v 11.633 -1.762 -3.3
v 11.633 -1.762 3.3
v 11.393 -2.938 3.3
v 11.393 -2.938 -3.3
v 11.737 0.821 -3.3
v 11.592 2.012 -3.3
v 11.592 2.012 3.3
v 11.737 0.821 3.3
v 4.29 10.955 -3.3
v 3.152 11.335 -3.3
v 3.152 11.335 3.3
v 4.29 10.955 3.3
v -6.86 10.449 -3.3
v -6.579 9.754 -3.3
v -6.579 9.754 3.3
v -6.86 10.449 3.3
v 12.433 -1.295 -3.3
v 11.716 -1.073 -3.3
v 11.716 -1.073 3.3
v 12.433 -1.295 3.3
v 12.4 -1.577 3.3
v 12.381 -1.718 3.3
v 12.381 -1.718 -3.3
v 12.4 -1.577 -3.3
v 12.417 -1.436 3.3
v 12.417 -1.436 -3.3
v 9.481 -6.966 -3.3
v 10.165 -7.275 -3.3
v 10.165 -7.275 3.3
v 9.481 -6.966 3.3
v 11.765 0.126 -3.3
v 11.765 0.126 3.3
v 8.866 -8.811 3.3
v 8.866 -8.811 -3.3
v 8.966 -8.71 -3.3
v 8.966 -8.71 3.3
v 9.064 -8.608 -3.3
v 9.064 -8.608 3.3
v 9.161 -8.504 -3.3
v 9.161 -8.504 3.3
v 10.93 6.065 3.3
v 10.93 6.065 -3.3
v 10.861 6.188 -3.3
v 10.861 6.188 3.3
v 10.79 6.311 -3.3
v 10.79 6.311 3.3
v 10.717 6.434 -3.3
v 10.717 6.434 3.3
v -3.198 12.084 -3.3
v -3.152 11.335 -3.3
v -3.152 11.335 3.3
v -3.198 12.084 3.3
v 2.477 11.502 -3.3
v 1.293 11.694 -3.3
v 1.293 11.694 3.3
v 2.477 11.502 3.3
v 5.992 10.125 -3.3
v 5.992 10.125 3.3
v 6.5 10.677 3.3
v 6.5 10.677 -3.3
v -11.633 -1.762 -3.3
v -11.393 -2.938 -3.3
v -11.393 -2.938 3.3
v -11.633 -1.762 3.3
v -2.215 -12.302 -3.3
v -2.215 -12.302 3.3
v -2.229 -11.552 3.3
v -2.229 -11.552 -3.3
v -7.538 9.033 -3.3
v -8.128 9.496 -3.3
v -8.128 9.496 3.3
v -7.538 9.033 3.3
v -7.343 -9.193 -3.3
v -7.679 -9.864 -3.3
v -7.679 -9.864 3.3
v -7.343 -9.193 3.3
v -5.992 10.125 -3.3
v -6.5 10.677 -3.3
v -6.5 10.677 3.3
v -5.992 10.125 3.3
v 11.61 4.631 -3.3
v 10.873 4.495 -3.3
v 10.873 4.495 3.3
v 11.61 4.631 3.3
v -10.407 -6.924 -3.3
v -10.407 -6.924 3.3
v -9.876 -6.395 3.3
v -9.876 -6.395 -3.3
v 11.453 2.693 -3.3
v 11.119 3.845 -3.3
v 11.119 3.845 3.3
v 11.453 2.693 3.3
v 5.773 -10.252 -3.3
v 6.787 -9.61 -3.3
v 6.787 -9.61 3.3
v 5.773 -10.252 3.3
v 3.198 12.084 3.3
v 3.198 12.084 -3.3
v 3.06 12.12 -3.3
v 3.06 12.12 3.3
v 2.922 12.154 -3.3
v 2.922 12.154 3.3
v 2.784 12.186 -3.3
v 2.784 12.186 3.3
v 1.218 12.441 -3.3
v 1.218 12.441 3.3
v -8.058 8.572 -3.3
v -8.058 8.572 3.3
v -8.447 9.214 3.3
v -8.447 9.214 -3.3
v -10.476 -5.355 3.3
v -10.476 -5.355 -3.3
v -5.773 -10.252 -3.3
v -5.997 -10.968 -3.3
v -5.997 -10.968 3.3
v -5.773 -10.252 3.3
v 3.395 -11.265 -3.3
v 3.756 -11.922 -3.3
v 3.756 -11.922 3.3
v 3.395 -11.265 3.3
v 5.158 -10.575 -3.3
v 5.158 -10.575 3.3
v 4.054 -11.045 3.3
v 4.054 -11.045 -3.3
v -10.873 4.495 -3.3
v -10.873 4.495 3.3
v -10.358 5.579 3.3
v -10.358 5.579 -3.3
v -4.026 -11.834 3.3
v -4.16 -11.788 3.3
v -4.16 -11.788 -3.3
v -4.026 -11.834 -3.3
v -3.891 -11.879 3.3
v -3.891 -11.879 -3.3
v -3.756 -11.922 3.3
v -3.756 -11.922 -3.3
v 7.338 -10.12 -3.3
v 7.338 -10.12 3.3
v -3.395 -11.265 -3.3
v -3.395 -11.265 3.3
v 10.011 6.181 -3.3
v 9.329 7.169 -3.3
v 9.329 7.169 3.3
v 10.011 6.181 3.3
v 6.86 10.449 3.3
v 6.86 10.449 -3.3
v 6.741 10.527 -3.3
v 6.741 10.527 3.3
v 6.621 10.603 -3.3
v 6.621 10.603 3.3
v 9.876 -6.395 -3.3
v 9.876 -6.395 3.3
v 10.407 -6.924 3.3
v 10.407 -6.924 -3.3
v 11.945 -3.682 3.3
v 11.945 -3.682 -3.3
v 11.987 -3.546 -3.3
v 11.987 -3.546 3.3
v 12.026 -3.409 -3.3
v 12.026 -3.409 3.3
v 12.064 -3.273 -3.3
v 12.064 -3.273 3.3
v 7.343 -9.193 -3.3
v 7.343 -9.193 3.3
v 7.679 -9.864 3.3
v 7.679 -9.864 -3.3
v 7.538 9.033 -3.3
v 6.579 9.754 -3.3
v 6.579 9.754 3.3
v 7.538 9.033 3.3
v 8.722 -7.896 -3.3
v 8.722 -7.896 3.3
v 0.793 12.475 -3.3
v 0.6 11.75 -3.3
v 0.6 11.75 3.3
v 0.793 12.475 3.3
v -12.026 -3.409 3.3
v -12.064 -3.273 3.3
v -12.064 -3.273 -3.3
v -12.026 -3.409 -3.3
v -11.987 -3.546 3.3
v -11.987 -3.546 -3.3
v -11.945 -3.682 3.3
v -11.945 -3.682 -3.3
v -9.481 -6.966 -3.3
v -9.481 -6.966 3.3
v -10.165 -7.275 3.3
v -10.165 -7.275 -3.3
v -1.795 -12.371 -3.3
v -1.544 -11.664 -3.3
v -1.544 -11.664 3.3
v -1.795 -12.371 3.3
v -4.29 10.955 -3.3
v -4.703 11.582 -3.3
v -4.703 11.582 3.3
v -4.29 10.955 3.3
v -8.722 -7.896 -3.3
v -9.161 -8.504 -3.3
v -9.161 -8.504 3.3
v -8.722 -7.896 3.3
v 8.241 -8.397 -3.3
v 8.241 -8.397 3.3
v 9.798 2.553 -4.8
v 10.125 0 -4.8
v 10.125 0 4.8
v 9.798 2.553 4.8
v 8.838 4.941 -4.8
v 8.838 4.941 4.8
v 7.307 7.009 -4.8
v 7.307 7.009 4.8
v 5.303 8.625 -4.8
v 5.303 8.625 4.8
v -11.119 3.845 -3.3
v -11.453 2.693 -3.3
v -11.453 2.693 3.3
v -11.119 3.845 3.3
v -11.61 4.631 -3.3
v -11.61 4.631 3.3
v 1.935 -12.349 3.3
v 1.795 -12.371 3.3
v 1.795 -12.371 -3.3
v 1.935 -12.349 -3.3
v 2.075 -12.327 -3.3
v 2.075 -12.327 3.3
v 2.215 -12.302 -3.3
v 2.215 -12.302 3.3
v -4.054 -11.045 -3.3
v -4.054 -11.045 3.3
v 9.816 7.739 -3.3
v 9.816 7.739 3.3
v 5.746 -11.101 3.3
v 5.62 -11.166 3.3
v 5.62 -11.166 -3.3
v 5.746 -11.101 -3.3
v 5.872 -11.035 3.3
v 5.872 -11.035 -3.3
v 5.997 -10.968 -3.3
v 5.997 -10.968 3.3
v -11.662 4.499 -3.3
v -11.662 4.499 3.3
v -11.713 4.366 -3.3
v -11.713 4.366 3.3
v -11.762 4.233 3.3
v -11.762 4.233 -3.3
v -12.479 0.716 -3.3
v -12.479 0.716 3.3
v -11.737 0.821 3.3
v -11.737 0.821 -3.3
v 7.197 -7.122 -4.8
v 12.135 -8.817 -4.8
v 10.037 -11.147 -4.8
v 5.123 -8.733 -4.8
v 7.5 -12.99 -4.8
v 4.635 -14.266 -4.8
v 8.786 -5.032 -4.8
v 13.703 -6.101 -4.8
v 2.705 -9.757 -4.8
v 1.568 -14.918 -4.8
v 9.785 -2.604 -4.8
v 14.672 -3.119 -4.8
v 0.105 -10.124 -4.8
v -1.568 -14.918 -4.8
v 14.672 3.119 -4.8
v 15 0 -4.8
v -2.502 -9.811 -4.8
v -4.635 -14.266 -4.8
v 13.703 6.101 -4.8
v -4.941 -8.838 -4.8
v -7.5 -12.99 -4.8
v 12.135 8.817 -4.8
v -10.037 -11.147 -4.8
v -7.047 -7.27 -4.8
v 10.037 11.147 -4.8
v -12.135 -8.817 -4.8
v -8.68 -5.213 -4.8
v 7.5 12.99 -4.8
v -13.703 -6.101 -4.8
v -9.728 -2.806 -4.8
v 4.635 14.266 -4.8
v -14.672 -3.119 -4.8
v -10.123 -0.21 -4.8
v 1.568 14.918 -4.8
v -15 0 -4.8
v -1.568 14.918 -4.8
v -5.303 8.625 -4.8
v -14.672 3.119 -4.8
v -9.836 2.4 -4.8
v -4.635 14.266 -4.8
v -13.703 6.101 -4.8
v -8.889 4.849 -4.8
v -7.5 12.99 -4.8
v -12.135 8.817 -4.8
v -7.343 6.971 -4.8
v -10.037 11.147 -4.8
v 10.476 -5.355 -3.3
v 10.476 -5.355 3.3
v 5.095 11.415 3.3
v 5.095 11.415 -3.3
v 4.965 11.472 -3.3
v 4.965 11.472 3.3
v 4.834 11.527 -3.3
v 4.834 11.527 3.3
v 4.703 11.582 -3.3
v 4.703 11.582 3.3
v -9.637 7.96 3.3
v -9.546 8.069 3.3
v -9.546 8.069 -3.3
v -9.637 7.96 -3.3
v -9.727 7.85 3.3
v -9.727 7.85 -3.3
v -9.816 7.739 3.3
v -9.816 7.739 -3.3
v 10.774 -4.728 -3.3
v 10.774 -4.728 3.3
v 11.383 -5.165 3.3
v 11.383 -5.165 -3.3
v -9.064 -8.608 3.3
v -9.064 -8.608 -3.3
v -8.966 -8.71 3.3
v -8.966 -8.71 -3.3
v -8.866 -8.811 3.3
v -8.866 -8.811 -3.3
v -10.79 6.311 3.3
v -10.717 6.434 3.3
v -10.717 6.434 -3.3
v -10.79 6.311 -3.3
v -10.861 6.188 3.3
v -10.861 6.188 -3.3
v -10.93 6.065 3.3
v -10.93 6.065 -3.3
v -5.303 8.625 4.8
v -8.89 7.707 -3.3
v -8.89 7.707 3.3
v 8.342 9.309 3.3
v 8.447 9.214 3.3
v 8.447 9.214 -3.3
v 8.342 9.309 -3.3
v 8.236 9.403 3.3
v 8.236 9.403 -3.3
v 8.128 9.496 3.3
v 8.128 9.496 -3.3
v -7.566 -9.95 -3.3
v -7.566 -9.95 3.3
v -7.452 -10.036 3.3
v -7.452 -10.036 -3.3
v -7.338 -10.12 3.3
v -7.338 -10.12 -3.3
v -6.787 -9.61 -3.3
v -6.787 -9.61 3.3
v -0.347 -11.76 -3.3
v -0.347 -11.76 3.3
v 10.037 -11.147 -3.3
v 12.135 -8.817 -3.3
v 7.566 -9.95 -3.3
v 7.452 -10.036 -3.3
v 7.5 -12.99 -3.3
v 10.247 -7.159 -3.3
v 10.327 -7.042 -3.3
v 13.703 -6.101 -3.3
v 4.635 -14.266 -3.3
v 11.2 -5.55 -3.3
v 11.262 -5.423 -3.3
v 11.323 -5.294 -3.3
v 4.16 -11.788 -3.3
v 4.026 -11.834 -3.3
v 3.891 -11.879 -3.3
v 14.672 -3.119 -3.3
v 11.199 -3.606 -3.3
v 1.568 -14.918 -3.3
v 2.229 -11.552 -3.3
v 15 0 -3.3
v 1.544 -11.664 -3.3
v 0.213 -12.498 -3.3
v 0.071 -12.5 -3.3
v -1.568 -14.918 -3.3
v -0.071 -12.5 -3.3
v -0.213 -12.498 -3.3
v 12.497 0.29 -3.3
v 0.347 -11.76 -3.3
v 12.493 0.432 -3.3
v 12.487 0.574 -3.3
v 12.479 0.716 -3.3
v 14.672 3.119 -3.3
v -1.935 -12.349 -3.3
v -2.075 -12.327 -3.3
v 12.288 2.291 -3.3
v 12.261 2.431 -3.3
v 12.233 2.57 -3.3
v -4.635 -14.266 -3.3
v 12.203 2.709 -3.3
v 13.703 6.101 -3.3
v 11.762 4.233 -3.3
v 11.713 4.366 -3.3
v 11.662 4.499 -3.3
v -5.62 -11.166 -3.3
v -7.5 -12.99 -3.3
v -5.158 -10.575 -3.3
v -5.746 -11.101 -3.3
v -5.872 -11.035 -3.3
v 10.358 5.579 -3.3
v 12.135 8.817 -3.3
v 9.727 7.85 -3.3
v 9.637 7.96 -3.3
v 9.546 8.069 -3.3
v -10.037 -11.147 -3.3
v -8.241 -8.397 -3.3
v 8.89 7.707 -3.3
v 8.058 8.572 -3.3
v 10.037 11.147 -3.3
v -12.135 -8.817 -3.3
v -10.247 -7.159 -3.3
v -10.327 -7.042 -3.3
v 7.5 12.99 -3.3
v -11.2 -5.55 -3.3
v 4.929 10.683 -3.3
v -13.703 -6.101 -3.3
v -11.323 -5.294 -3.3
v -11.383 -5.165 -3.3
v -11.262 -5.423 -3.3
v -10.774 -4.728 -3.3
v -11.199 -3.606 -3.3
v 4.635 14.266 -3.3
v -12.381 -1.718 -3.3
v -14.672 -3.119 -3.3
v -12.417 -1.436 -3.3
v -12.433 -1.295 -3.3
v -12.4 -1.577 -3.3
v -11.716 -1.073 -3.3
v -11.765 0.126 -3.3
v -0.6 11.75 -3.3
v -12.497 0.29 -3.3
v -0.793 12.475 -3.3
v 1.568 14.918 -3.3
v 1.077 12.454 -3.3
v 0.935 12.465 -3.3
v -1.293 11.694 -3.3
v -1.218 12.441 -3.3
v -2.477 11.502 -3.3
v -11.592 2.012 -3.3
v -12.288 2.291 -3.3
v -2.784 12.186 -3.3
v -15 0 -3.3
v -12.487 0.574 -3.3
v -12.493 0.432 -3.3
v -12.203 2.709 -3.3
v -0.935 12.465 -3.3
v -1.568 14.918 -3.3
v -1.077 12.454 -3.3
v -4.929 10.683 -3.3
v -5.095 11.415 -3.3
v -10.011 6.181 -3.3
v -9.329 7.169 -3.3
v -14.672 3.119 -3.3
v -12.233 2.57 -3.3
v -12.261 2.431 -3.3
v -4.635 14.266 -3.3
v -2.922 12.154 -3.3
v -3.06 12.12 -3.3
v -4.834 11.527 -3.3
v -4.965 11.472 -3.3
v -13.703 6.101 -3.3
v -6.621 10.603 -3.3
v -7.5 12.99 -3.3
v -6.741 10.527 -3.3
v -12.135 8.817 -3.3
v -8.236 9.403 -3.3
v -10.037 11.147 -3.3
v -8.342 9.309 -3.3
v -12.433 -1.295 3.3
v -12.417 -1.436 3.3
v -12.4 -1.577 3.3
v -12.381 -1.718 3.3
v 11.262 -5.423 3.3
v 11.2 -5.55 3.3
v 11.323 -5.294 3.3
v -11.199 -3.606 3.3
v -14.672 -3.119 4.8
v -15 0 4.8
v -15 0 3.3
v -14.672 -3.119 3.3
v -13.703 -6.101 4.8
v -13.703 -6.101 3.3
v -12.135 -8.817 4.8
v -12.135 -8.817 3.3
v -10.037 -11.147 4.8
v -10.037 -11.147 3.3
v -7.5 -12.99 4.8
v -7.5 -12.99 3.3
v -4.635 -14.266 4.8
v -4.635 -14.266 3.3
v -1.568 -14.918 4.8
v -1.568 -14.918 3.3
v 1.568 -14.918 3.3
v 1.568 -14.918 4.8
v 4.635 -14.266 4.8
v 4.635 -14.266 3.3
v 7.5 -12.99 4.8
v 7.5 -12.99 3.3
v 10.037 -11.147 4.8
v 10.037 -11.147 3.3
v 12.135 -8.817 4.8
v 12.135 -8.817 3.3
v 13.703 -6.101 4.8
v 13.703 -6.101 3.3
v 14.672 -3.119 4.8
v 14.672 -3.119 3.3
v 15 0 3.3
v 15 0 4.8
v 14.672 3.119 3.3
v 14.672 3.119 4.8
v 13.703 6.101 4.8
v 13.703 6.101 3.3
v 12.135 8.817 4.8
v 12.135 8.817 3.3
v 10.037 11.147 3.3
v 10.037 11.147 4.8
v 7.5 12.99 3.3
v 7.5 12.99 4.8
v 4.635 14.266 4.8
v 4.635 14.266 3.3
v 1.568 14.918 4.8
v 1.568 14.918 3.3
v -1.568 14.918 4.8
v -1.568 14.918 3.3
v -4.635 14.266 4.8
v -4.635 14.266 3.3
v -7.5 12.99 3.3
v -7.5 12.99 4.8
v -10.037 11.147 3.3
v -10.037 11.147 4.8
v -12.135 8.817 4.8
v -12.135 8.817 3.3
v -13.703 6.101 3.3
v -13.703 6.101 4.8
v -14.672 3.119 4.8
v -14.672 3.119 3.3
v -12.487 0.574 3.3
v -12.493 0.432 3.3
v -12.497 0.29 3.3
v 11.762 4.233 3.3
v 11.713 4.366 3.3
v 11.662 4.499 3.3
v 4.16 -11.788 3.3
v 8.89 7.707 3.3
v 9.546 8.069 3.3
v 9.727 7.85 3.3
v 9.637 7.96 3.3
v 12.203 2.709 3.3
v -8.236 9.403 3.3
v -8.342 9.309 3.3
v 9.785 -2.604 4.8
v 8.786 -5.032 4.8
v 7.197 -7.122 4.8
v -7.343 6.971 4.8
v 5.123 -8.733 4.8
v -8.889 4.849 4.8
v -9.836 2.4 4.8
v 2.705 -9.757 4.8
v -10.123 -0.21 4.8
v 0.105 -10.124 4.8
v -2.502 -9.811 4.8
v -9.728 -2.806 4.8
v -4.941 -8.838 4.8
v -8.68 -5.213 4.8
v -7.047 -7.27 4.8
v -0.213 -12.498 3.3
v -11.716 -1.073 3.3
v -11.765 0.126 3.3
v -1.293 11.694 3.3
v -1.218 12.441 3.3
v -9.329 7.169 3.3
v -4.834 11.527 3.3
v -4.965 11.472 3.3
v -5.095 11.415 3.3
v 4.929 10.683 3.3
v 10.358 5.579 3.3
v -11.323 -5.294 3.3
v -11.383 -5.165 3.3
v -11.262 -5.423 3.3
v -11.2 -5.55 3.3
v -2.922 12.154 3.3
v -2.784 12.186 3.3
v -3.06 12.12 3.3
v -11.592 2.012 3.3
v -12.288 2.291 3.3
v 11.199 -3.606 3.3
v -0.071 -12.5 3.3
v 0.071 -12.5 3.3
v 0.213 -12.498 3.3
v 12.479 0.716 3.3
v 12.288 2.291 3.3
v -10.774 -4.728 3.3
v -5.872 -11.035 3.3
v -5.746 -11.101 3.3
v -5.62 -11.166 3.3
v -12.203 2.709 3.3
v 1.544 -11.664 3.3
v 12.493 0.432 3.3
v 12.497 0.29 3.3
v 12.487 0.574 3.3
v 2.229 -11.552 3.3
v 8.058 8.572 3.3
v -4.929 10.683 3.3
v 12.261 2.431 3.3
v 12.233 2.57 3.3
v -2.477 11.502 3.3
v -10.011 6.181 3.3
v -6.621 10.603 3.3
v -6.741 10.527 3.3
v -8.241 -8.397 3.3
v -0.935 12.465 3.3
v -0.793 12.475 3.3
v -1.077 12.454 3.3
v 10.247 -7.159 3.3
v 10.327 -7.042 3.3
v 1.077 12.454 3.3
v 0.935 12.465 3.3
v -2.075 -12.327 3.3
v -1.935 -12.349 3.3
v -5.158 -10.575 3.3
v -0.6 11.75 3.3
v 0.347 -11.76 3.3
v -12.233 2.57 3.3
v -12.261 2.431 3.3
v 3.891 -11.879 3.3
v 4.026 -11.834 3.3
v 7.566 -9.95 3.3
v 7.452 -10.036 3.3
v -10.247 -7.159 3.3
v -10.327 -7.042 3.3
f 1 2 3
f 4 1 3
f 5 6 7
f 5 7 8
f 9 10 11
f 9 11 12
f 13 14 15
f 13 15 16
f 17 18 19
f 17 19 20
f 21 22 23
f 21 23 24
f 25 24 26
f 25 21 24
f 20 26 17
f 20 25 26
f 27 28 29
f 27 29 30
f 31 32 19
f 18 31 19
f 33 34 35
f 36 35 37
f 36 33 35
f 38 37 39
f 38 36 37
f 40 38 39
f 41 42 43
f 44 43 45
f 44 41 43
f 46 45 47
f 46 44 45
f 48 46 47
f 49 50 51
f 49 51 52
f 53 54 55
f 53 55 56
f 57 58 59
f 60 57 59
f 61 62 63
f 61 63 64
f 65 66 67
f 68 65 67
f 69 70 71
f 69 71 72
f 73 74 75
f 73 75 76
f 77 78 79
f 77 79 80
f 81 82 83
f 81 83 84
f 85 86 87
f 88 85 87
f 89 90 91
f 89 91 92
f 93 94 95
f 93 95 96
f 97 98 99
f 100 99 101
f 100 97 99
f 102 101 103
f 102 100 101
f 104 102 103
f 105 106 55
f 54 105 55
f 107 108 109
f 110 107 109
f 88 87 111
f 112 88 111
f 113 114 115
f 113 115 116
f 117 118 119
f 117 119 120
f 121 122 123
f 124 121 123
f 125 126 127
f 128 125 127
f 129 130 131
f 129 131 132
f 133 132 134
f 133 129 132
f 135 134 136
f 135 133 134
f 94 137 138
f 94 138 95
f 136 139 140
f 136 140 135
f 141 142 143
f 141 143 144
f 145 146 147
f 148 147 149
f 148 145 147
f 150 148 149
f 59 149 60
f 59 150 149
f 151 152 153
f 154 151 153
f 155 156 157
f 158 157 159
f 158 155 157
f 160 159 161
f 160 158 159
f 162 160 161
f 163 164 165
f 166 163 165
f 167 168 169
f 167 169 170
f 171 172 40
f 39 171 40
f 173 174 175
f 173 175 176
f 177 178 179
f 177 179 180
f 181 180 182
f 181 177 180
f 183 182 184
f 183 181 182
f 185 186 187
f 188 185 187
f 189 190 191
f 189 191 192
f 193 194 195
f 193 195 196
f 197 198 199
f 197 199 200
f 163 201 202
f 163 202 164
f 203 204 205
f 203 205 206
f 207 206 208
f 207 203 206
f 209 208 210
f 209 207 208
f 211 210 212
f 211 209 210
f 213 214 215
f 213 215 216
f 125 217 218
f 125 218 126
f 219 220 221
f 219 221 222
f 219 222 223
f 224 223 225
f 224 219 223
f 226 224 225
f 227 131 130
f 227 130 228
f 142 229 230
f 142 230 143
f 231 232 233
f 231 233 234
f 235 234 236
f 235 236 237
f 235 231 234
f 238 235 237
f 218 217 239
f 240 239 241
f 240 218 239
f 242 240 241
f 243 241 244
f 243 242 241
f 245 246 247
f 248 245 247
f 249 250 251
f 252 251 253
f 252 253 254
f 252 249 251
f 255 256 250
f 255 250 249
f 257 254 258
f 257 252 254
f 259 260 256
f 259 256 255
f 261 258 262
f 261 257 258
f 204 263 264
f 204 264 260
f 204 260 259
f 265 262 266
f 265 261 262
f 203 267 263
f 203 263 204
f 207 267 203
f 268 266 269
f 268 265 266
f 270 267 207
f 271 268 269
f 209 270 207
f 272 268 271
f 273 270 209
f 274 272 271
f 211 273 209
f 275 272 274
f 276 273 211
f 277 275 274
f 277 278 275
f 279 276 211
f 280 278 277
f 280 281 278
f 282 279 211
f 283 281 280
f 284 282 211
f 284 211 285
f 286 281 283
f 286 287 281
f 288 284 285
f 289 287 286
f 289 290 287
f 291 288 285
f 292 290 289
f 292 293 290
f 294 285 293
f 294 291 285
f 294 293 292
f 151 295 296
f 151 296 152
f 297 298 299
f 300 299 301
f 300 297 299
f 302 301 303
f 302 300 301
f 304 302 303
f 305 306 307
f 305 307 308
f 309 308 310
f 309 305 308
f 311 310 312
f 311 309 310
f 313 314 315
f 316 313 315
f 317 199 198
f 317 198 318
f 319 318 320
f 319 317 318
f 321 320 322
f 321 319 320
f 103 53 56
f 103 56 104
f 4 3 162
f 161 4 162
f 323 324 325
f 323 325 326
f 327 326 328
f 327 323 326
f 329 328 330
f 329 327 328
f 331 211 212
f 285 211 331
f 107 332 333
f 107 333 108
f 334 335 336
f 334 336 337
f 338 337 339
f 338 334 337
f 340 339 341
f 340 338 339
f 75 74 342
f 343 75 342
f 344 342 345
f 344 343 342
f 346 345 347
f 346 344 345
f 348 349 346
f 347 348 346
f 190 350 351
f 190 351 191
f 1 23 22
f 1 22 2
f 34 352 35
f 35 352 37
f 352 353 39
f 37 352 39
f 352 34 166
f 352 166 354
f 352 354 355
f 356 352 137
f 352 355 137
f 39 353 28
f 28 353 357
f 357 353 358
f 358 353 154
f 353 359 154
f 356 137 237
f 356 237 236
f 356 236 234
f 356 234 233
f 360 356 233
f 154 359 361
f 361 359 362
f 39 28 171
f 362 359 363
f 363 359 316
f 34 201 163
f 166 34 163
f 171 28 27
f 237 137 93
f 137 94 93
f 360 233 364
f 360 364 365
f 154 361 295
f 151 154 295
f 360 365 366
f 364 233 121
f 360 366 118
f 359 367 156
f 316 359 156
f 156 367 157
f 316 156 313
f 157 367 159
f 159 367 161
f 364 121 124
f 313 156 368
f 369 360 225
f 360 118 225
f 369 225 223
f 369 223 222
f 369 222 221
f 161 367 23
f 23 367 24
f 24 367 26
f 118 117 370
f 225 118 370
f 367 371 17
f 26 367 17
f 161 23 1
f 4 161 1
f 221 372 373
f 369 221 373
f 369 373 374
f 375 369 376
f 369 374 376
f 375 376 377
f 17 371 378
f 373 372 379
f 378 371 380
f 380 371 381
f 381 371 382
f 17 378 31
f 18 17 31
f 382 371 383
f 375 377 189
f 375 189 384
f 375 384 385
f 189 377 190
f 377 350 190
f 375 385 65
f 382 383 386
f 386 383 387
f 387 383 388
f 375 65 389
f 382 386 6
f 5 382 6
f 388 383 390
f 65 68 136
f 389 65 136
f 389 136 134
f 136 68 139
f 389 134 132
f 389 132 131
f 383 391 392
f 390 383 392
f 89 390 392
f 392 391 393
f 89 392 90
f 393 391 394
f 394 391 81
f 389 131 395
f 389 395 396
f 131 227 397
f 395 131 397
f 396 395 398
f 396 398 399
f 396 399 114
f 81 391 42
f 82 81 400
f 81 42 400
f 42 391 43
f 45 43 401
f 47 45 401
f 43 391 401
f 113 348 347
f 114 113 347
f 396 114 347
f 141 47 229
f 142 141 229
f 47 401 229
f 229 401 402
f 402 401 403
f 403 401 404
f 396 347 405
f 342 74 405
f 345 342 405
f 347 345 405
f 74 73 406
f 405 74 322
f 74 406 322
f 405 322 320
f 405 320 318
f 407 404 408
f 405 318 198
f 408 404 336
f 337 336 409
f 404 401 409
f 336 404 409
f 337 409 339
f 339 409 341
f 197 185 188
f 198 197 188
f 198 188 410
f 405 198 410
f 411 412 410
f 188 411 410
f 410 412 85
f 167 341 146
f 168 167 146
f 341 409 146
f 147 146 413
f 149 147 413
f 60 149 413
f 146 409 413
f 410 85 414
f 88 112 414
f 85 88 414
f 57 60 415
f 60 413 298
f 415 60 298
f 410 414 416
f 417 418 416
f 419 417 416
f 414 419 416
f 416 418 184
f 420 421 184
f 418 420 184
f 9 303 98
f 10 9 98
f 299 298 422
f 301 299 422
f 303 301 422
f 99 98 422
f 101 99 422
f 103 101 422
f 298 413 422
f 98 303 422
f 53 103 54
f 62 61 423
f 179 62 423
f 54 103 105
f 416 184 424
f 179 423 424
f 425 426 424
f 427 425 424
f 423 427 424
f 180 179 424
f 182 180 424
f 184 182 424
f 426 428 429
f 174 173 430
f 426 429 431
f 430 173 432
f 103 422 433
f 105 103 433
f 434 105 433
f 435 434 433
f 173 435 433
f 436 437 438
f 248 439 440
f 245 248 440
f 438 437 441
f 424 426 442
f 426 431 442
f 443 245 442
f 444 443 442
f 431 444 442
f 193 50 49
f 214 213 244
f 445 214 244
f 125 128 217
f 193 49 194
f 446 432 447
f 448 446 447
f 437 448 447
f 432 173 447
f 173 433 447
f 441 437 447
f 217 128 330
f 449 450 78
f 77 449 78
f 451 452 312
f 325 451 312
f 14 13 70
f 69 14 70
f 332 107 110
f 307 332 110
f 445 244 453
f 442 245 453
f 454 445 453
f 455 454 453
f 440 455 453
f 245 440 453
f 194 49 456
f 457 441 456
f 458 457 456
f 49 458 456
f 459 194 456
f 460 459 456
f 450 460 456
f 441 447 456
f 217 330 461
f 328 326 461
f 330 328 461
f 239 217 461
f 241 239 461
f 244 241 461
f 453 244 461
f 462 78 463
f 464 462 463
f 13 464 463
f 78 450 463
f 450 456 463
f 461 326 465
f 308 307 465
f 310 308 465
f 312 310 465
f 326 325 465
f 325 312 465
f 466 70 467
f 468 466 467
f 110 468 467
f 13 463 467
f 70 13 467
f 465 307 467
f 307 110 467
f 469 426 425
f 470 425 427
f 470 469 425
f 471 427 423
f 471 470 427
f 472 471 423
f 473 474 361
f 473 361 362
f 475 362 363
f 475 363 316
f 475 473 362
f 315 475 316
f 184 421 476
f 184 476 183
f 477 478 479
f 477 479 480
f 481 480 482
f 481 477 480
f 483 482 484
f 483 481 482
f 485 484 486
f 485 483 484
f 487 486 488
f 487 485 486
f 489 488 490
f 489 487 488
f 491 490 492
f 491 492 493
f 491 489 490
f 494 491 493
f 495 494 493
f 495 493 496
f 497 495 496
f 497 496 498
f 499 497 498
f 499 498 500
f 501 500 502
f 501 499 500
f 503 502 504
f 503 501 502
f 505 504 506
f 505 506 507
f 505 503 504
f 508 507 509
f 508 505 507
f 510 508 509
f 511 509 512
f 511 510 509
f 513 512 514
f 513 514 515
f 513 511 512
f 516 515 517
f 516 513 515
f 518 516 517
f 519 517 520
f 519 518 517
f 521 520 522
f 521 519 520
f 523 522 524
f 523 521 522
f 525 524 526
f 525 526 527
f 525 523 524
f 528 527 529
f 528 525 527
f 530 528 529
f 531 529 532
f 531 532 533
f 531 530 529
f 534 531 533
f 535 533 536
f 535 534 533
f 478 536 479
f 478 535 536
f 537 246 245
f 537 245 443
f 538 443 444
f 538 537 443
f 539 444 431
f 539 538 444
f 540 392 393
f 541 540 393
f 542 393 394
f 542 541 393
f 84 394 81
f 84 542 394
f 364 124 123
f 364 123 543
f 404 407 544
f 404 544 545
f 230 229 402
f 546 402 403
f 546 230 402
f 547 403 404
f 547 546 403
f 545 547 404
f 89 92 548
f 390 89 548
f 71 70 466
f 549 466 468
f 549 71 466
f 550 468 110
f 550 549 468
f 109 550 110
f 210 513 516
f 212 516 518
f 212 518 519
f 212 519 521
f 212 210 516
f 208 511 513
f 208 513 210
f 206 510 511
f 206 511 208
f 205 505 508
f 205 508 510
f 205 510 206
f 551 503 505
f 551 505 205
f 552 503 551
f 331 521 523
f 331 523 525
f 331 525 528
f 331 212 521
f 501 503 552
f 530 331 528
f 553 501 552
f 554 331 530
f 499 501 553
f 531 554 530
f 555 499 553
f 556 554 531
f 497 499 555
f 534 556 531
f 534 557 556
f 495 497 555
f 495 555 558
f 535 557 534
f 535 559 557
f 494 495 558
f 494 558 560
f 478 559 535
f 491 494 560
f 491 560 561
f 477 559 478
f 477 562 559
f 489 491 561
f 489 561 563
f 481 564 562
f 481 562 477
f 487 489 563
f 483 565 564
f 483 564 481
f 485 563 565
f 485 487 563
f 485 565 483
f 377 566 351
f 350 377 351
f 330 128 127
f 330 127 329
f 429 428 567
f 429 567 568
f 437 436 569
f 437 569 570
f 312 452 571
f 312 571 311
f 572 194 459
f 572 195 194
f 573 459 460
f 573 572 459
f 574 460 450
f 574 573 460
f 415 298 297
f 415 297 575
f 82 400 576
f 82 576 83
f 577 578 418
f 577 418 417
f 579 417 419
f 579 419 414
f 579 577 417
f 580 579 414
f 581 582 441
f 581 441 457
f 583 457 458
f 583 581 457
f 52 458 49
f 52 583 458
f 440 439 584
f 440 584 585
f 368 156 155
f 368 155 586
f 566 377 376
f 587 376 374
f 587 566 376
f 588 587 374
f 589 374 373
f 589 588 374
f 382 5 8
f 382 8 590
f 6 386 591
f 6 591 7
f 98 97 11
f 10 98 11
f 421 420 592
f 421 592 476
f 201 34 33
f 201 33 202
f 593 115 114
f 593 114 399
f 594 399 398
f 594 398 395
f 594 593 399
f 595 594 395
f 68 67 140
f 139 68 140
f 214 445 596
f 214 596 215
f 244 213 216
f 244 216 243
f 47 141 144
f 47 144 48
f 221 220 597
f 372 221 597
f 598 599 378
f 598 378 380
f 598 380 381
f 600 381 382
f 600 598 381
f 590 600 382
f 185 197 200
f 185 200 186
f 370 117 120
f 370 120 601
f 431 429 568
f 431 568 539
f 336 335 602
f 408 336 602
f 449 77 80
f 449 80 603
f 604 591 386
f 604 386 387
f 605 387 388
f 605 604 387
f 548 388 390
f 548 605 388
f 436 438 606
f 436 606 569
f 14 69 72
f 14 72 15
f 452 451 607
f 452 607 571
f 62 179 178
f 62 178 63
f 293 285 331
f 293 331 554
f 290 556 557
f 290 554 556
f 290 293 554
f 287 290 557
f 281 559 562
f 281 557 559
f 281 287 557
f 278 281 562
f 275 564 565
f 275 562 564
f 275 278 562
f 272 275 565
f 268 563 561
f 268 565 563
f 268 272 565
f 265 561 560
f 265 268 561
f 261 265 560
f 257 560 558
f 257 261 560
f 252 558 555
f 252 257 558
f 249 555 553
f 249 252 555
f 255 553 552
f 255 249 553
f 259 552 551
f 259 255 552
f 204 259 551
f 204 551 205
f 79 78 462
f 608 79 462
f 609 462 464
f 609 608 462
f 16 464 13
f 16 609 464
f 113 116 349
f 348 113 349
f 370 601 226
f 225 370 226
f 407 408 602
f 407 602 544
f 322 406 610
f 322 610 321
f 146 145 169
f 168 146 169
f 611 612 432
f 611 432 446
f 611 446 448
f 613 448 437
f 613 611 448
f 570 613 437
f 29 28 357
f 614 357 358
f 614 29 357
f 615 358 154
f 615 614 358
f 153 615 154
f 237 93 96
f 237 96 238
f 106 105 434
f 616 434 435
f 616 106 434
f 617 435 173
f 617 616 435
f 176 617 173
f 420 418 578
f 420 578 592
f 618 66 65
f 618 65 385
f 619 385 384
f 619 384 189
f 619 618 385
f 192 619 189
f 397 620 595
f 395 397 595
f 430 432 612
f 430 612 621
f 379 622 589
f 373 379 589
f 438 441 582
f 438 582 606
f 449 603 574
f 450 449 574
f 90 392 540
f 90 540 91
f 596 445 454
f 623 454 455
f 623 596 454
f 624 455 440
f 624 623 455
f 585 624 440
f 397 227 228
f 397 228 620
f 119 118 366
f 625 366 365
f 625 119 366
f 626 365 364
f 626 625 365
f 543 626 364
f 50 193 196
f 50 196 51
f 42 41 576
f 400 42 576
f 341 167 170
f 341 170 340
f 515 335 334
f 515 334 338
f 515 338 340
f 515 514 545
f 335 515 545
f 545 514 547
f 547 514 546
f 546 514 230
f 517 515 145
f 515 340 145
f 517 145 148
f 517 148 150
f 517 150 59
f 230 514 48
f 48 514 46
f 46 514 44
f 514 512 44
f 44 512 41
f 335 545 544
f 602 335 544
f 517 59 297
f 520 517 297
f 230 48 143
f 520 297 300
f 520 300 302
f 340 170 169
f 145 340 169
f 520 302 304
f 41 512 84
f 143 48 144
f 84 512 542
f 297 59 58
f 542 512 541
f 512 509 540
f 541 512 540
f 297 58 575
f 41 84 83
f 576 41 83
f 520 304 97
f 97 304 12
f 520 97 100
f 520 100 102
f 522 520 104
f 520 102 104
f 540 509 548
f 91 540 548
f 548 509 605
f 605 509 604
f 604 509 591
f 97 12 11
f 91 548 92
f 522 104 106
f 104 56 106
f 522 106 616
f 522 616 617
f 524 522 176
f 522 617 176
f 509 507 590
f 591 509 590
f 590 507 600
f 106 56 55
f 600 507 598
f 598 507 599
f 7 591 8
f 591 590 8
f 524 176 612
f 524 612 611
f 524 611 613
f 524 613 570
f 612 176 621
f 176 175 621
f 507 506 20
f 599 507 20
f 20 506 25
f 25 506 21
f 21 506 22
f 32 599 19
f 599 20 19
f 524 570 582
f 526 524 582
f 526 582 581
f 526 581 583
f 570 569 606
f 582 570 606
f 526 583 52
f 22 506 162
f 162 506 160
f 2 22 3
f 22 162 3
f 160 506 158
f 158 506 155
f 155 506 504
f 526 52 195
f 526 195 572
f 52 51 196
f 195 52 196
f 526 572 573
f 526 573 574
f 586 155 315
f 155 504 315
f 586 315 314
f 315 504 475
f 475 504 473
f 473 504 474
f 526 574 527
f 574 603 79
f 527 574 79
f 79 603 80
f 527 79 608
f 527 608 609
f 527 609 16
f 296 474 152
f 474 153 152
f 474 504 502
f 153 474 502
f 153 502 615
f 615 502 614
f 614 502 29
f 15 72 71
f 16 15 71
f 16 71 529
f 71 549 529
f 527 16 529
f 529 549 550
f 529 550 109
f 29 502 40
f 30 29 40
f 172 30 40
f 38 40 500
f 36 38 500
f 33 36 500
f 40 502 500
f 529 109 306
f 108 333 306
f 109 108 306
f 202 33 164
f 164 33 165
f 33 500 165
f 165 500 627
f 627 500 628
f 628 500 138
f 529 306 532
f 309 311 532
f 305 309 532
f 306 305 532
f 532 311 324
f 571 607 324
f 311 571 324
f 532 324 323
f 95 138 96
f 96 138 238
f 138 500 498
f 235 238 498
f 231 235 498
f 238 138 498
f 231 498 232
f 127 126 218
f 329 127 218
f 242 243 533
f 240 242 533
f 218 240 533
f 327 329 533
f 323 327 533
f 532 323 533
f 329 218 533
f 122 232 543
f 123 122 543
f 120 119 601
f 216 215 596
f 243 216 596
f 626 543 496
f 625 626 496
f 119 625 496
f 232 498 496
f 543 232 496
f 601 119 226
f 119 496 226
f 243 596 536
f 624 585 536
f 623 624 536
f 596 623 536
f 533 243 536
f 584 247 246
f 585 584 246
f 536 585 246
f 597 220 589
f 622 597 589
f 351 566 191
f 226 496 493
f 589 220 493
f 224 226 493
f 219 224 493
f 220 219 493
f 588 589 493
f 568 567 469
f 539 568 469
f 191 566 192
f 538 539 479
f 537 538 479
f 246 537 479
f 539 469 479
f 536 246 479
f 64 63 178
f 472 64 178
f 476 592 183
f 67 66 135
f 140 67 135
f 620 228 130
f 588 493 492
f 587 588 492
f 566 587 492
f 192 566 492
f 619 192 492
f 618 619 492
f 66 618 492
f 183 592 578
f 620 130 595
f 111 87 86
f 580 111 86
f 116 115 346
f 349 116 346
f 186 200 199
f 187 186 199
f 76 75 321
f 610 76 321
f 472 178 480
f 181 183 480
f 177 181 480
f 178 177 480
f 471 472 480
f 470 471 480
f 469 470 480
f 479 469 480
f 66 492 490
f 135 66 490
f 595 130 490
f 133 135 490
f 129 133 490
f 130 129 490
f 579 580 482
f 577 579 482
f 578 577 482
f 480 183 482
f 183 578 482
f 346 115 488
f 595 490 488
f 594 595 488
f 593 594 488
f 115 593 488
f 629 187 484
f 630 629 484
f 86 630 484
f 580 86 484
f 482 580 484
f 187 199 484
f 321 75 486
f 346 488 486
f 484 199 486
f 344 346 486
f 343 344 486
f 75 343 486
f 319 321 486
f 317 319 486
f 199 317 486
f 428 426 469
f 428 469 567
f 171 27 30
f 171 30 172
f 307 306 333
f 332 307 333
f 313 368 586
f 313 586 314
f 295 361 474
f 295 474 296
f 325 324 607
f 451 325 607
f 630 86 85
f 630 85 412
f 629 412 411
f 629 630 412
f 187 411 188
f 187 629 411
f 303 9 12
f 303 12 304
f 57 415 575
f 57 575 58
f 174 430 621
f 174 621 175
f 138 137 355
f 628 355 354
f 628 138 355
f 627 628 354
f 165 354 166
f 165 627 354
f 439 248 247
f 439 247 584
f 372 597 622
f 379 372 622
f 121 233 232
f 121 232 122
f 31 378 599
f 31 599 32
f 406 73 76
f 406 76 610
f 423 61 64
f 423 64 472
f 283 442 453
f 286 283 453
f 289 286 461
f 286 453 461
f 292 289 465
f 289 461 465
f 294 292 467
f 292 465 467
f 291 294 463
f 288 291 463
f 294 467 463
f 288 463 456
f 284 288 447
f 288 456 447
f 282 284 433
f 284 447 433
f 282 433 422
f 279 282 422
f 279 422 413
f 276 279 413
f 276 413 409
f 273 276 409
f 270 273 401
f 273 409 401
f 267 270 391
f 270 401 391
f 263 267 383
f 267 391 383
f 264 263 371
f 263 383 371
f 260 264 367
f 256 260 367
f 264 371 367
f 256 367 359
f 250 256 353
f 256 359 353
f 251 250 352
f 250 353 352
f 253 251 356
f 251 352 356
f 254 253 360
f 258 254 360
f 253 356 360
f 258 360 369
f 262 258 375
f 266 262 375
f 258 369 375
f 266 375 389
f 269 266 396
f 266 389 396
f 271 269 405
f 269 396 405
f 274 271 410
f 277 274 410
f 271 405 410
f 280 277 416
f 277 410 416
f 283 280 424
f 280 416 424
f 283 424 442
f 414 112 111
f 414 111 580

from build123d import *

# Parameters (mm, degrees)
SKETCH1_R               = 12.5
BOSS_EXTRUDE1_DEPTH     = 3.3
CUT_EXTRUDE1_START      = -6.6
CUT_EXTRUDE1_DEPTH      = 26.469552194
CIRPATTERN2_COUNT       = 39
SKETCH2_R               = 15
BOSS_EXTRUDE3_DEPTH     = 1.5
BOSS_EXTRUDE4_START     = 1.5
SKETCH3_R               = 14.999999972
BOSS_EXTRUDE4_DEPTH     = 1.5
CUT_EXTRUDE3_DEPTH      = 24.284329494
CUT_EXTRUDE3_DEPTH_BACK = 24.284329494


with BuildPart() as part:
    # Sketch1 → Boss-Extrude1 (new, symmetric)
    with BuildSketch(Plane.XY):
        Circle(SKETCH1_R)
    extrude(amount=BOSS_EXTRUDE1_DEPTH, both=True)

    # Sketch4 → Cut-Extrude1 (cut)
    with BuildSketch(Plane.XY.offset(3.3).offset(CUT_EXTRUDE1_START)):
        Polygon((-0.6, 11.75), (0.6, 11.75), (0.8, 12.5), (-0.8, 12.5), align=None)
    cut_extrude1 = extrude(amount=CUT_EXTRUDE1_DEPTH, mode=Mode.SUBTRACT)

    # CirPattern2: Cut-Extrude1 ×39 about axis
    cirpattern2_axis = Axis((0, 0, 0), (0, 0, 1))
    for i in range(1, CIRPATTERN2_COUNT):
        add(cut_extrude1.rotate(cirpattern2_axis, i * 360 / CIRPATTERN2_COUNT), mode=Mode.SUBTRACT)

    # Sketch2 → Boss-Extrude3 (add)
    with BuildSketch(Plane(origin=(0, 0, -3.3), x_dir=(-1, 0, 0), z_dir=(0, 0, -1))):
        Circle(SKETCH2_R)
    extrude(amount=BOSS_EXTRUDE3_DEPTH)

    # Sketch3 → Boss-Extrude4 (add)
    with BuildSketch(Plane.XY.offset(3.3).offset(BOSS_EXTRUDE4_START)):
        with Locations(Location((0, 0, 0), (0, 0, 180))):
            Circle(SKETCH3_R)
    extrude(amount=-BOSS_EXTRUDE4_DEPTH)

    # Sketch6 → Cut-Extrude3 (cut, two sides: drawn at the far end of the back side and taken through both)
    with BuildSketch(Plane.XY.offset(4.8).offset(-CUT_EXTRUDE3_DEPTH_BACK)):
        with BuildLine():
            Line((5.303300859, 8.625), (-5.303300859, 8.625))
            ThreePointArc((-5.303300859, 8.625), (-4.940632743, -8.83774706), (10.125, 0))
            ThreePointArc((10.125, 0), (8.83774706, 4.940632743), (5.303300859, 8.625))
        make_face()
    extrude(amount=CUT_EXTRUDE3_DEPTH + CUT_EXTRUDE3_DEPTH_BACK, mode=Mode.SUBTRACT)


solid = part.part
